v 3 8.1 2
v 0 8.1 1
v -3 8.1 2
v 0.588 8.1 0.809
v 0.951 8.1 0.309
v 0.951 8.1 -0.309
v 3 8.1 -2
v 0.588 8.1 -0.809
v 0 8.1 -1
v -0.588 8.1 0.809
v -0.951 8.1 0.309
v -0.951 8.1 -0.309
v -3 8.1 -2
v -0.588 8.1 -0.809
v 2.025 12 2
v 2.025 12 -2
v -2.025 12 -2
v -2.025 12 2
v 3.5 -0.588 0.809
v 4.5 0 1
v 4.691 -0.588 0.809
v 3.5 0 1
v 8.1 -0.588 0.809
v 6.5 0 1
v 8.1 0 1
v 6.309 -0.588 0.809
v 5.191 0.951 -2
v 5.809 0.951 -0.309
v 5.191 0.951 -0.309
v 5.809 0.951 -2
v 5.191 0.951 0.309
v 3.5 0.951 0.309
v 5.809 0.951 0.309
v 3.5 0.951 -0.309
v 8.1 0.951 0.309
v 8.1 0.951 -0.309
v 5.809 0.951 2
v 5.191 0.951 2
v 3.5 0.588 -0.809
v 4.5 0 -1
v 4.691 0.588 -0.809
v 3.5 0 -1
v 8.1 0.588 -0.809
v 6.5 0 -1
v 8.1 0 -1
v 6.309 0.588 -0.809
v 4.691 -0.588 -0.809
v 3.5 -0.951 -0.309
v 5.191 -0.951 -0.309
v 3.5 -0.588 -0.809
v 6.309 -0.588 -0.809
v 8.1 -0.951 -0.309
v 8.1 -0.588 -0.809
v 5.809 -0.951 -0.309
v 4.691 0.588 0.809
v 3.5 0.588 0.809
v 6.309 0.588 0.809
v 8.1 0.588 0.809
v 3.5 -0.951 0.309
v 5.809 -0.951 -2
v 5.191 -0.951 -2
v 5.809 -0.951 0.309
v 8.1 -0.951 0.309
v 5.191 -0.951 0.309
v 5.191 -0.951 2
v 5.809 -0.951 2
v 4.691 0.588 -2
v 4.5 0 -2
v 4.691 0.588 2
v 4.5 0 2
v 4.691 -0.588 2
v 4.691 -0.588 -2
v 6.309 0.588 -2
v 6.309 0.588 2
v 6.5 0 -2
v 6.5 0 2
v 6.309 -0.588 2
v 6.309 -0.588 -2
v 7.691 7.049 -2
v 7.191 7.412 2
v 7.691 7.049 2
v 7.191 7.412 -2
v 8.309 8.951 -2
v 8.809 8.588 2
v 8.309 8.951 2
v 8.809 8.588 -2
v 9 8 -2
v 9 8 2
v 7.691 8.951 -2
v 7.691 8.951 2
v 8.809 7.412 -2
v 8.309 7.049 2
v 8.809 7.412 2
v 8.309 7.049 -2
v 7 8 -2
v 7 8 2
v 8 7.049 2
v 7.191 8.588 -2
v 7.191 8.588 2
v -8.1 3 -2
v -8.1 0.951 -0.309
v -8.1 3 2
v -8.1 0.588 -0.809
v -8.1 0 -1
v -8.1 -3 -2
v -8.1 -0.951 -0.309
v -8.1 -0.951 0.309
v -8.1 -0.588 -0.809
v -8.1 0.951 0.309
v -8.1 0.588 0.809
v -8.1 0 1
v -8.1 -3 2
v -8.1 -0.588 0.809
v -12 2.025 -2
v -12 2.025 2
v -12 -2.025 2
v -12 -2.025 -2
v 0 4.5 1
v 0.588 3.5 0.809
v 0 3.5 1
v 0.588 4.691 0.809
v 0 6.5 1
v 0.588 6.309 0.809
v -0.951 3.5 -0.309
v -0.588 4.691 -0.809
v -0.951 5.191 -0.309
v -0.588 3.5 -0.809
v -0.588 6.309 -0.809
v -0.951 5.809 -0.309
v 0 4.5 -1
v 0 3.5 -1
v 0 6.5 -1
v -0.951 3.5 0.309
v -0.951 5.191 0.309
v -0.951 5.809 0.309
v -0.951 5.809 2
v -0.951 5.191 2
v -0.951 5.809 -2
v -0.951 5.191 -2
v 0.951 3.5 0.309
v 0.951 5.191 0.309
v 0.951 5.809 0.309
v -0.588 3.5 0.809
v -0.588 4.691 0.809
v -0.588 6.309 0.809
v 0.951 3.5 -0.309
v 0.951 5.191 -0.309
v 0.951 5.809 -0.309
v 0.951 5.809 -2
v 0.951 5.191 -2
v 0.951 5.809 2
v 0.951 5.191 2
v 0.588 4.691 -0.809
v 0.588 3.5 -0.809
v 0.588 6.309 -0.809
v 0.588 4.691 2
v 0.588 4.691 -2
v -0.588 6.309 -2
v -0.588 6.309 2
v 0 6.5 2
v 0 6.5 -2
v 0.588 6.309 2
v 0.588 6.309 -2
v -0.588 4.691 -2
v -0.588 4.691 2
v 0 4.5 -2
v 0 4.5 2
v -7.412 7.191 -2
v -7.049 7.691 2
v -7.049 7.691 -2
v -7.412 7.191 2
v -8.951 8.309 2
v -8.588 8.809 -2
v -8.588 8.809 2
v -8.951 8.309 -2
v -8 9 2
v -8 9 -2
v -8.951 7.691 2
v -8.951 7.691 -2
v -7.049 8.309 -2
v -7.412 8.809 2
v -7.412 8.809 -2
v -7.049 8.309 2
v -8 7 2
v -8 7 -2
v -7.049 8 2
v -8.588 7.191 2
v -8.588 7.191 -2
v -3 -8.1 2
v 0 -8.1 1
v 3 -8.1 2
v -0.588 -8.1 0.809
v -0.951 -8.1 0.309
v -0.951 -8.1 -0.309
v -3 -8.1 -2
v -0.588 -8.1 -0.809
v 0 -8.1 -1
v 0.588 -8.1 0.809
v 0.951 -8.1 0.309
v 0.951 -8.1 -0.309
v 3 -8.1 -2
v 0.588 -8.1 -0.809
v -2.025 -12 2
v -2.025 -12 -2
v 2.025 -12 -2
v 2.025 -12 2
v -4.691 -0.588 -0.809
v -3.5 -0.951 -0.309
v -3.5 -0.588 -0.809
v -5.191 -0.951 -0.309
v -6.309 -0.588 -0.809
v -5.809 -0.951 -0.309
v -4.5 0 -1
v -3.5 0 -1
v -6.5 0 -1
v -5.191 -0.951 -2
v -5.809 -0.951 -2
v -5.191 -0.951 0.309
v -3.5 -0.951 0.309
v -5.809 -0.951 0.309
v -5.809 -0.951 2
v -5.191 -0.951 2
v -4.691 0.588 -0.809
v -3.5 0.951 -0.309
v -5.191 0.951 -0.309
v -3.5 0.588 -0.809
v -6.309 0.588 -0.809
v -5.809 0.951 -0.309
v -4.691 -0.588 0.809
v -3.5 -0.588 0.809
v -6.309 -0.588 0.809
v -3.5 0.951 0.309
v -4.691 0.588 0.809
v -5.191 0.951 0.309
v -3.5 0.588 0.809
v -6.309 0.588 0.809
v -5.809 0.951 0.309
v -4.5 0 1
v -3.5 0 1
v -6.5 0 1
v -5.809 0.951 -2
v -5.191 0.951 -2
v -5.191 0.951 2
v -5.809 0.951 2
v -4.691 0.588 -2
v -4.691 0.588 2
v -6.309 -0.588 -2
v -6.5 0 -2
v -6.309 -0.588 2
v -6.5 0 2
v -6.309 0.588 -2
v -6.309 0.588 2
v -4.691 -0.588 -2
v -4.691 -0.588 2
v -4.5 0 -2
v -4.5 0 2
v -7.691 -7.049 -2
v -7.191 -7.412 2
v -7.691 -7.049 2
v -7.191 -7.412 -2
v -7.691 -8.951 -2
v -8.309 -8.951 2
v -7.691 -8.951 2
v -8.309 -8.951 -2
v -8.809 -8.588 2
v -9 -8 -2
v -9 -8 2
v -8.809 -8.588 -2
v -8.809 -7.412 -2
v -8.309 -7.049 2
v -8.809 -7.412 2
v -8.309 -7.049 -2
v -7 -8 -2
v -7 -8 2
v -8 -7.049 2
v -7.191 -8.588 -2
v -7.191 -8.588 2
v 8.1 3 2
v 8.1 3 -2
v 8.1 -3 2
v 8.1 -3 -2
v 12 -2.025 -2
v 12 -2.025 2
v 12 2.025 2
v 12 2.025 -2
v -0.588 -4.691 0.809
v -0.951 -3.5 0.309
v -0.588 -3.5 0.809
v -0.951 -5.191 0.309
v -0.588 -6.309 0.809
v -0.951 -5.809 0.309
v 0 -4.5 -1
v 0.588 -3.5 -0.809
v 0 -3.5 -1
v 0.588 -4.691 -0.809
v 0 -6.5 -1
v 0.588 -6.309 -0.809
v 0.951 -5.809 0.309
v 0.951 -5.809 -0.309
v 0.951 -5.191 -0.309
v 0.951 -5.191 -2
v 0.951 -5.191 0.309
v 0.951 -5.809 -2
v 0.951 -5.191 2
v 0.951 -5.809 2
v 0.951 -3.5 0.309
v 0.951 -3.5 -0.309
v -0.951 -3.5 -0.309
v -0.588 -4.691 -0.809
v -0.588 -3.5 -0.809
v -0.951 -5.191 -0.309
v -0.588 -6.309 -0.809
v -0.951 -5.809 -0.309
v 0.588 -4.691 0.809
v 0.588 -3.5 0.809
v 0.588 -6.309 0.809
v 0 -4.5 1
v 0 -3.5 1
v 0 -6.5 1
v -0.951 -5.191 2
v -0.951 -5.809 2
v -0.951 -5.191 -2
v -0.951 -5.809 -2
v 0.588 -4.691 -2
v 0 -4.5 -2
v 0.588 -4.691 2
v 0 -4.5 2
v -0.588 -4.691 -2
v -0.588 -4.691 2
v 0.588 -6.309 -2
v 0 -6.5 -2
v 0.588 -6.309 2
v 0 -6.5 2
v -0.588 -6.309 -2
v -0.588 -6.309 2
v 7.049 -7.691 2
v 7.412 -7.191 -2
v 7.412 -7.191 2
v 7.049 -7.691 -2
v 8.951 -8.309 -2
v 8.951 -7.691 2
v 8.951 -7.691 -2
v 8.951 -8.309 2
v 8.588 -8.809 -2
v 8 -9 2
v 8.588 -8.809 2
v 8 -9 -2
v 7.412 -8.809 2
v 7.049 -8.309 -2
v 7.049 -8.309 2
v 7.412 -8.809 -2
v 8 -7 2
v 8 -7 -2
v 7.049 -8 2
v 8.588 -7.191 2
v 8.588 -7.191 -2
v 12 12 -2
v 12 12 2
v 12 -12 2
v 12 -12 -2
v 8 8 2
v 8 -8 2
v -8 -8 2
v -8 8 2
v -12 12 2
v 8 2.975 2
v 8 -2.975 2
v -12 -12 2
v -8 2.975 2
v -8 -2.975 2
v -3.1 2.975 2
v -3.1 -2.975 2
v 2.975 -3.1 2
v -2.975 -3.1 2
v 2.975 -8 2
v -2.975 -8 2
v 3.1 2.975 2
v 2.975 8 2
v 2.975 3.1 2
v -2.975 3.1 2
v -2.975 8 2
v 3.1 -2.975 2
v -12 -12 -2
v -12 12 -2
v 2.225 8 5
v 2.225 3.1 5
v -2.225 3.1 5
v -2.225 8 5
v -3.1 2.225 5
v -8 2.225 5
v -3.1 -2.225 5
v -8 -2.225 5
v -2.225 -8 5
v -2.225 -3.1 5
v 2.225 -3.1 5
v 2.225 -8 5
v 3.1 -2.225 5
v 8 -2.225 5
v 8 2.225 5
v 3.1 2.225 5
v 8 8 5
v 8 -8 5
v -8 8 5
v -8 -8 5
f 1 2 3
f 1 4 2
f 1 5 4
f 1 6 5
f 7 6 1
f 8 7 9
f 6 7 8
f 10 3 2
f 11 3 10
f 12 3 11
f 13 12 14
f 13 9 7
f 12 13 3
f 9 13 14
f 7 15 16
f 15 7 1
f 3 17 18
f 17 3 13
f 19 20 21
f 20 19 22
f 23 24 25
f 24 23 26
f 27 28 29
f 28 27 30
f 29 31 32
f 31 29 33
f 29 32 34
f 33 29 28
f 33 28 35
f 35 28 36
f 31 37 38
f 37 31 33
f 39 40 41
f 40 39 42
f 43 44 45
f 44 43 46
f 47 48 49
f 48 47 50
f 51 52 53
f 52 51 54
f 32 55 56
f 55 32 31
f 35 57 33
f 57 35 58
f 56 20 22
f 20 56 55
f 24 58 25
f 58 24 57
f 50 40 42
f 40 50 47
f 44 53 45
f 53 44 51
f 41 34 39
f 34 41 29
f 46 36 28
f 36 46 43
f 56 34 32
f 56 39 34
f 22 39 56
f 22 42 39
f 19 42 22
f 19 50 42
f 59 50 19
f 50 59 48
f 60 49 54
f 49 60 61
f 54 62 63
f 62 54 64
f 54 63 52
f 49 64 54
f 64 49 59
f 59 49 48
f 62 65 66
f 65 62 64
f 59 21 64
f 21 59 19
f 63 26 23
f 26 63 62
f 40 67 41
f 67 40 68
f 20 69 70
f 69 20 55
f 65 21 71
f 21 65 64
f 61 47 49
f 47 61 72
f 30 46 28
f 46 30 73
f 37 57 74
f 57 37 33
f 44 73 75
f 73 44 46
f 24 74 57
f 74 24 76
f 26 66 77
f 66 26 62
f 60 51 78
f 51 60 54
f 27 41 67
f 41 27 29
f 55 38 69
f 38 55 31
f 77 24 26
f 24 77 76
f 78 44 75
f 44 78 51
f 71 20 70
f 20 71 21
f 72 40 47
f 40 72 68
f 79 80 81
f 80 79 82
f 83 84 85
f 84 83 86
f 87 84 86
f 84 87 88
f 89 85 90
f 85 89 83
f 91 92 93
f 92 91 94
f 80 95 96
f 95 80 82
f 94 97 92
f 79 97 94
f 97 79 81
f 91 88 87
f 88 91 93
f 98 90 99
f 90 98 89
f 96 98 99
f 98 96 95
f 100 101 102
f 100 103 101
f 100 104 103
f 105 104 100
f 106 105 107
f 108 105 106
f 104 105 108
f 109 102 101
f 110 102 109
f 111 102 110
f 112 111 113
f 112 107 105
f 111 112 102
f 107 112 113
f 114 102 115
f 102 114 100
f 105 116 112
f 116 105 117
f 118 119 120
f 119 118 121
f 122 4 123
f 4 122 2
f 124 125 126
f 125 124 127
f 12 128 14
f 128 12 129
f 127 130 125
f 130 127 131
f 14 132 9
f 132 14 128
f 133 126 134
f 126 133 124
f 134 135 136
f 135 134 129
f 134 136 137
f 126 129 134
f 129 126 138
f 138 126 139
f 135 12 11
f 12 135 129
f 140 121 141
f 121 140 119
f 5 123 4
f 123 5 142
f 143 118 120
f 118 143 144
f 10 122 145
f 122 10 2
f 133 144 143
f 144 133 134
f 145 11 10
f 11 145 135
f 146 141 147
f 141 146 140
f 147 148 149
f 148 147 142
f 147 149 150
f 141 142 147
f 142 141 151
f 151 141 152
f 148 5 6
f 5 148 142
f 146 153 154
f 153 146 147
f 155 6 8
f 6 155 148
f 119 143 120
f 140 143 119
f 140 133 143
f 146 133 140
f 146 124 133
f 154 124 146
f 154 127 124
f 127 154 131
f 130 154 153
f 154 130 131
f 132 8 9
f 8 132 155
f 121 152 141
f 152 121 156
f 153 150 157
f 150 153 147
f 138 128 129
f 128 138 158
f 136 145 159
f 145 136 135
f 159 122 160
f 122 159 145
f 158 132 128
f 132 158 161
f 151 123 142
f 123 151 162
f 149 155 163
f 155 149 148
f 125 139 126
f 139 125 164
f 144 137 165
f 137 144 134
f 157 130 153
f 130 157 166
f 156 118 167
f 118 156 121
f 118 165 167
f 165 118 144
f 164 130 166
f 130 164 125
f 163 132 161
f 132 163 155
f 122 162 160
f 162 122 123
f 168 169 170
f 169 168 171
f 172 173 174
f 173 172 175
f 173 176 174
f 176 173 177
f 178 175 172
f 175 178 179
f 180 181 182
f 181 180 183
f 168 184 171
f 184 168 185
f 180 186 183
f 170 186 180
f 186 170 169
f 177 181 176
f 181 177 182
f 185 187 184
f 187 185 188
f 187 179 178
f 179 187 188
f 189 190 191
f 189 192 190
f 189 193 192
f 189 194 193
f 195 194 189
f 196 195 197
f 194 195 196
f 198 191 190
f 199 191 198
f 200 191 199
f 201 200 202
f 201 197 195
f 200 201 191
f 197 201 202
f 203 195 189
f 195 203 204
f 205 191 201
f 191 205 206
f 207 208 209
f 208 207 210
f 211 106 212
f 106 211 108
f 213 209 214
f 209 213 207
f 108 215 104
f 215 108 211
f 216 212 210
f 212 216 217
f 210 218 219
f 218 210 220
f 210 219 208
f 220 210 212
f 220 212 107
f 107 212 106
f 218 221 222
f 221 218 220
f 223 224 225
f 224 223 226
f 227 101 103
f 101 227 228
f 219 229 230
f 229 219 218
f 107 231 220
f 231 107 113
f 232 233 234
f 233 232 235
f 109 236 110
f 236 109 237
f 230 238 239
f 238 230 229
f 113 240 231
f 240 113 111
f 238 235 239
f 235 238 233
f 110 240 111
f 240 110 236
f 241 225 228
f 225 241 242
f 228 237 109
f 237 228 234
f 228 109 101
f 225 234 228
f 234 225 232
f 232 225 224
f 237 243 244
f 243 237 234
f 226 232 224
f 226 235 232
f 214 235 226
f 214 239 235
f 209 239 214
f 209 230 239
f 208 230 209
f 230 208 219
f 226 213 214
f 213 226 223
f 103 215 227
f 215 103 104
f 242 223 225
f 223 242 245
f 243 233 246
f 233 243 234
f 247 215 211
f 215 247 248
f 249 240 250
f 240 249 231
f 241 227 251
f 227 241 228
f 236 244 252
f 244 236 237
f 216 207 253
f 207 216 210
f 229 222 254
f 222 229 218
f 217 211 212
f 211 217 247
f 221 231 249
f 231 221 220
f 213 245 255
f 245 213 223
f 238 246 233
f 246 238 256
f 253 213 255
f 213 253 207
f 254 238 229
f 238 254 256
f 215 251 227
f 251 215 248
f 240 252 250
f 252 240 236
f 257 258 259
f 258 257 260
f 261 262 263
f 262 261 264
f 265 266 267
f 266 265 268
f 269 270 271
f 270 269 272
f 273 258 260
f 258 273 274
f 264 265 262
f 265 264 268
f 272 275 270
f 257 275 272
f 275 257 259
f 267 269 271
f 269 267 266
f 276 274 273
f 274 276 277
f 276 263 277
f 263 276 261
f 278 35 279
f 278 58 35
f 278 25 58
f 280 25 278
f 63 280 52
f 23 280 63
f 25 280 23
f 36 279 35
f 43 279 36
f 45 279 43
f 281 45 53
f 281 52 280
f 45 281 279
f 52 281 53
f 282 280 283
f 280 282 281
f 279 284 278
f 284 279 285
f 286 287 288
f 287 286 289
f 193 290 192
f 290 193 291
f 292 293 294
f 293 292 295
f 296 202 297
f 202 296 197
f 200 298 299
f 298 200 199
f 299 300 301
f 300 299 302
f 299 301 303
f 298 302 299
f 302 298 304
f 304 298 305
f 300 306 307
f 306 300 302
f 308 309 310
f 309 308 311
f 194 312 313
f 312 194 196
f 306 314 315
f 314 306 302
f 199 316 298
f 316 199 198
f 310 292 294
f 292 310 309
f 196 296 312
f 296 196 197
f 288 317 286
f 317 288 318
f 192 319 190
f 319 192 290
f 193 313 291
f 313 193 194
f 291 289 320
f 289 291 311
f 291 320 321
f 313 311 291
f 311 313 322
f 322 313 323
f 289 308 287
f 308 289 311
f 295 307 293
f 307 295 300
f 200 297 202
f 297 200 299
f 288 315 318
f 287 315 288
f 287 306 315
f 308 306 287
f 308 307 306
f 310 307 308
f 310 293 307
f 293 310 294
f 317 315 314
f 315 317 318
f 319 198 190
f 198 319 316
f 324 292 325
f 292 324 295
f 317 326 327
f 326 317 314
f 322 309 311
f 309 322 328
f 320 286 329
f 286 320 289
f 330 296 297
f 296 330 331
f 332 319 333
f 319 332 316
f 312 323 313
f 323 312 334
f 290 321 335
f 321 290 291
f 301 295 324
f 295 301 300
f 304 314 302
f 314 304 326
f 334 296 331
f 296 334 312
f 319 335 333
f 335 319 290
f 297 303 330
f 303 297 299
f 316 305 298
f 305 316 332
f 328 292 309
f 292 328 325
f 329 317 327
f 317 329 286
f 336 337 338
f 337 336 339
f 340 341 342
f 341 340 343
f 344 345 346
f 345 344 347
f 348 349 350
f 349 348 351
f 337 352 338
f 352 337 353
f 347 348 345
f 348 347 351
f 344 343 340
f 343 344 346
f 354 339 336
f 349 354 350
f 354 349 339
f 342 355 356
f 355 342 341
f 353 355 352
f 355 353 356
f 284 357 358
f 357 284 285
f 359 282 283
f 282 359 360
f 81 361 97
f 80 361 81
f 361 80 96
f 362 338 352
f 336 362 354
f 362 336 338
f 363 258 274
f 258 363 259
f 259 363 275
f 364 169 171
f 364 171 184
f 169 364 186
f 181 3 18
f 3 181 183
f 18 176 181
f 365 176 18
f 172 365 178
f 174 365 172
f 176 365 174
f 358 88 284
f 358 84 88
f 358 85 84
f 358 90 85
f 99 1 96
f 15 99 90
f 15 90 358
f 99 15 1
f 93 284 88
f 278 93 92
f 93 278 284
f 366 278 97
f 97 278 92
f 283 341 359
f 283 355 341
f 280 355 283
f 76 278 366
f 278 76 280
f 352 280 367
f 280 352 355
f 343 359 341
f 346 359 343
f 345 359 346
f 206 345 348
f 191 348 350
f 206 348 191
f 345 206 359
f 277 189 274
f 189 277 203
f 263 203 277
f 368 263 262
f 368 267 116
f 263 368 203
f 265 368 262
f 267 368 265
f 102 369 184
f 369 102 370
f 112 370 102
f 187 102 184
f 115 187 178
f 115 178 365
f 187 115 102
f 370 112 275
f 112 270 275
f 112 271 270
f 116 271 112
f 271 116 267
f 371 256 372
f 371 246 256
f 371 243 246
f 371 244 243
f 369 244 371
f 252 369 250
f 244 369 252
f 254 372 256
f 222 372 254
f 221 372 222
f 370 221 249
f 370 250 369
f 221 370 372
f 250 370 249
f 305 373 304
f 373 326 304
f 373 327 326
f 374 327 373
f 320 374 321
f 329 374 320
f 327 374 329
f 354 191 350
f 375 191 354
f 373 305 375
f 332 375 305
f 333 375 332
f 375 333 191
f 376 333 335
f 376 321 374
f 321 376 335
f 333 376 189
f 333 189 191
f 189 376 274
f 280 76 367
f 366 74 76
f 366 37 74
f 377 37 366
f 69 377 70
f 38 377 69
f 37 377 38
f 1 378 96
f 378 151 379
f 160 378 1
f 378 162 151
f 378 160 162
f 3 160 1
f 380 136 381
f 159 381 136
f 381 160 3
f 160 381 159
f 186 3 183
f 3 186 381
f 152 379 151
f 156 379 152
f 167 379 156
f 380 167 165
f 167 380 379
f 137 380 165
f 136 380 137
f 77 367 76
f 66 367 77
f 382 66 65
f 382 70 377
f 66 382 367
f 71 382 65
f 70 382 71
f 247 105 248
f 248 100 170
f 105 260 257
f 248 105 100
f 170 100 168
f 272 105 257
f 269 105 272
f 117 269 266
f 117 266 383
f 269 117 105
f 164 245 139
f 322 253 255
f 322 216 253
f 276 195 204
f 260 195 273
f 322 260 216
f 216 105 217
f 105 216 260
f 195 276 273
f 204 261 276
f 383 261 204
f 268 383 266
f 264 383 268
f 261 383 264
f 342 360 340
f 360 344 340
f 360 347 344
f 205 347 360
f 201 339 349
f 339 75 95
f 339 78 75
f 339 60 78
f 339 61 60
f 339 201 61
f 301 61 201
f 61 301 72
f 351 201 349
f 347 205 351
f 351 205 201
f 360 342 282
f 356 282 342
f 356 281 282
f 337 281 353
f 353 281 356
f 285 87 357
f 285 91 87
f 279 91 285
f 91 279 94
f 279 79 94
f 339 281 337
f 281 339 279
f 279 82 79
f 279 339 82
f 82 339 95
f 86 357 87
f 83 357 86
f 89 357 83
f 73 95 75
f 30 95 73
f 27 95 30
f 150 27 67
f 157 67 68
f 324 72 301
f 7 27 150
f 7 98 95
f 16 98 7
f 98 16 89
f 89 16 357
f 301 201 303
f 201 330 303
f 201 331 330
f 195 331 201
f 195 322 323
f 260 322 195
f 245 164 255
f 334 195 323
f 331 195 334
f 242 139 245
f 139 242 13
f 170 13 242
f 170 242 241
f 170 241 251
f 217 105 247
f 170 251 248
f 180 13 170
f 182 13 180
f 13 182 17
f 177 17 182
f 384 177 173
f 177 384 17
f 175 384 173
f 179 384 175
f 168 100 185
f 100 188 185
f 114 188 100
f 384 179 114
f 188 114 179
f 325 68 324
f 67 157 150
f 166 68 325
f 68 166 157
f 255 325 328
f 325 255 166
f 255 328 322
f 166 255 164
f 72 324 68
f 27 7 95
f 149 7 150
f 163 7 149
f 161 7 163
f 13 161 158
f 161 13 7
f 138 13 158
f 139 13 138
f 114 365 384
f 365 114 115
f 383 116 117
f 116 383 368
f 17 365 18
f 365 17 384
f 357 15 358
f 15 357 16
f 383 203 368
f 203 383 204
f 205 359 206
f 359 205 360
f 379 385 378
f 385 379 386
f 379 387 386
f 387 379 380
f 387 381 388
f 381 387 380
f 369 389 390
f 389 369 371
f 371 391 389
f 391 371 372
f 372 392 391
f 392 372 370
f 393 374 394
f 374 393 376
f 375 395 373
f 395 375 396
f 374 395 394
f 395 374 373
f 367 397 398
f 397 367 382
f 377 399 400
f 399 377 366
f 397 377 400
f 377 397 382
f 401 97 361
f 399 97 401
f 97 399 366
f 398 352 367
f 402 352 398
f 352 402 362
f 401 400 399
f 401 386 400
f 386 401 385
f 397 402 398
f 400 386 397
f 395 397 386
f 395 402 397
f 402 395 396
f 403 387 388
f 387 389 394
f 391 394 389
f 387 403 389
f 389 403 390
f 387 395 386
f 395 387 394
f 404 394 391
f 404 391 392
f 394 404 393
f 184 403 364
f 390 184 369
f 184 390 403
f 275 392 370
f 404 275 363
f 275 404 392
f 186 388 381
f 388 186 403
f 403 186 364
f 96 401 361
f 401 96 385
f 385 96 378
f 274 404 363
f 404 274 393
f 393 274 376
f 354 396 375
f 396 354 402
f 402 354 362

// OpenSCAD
// file: TrapezioIsoceles.scad
module TrapezioIsoceles(profundidade,largura,altura,deslocamento) {

//altura = 4;
//profundidade = 5; 
//largura = 6;
//deslocamento = 1; 
//altura=altura+0.2;
deslocamentoZ = -altura/2;
deslocamentoX = -largura/2; 
deslocamentoY = -profundidade/2;

pontosTrapezio = [
  [ deslocamentoX, deslocamentoY,  deslocamentoZ ],  //0
  [ deslocamentoX+largura, deslocamentoY,  deslocamentoZ ],  //1
  [ deslocamentoX+largura, deslocamentoY+profundidade,  deslocamentoZ ],  //2
  [ deslocamentoX+0, deslocamentoY+profundidade, deslocamentoZ ],  //3
  [ deslocamentoX+deslocamento,  deslocamentoY, deslocamentoZ+altura ],  //4
  [ deslocamentoX+largura-deslocamento,  deslocamentoY, deslocamentoZ+altura ],  //5
  [ deslocamentoX+largura-deslocamento,deslocamentoY+profundidade, deslocamentoZ+altura ],  //6
  [ deslocamentoX+deslocamento,  deslocamentoY+profundidade, deslocamentoZ+altura ]]; //7
  
facesTrapezio = [
  [0,1,2,3],  // bottom
  [4,5,1,0],  // front
  [7,6,5,4],  // top
  [5,6,2,1],  // right
  [6,7,3,2],  // back
  [7,4,0,3]]; // left
  
polyhedron( pontosTrapezio, facesTrapezio );


//polygon([[0,0],[5,0],[4,3],[1,3]]);

//cube([17,17,3]);
}
// file: EncaixeU.scad
use <TrapezioIsoceles.scad>


module EncaixeU(tamCubo)  {

altura = 4; 
//tamCubo = 24; 

profundidadeTrapezio = 5; 
larguraTrapezio = 6; 
posTrapezio = tamCubo/2 - altura/2;
hFuros = profundidadeTrapezio;

tamCuboSuperior = tamCubo - 2*altura ; 
posTrapezioSuperior = tamCuboSuperior/2 - profundidadeTrapezio/2;

union() {
// Base da estrutra de encaixe 
difference() {
    cube([tamCubo,tamCubo,altura],center=true);
    for ( a = [0:90:270]) {
        rotate([0,0,a])
        translate([0,posTrapezio+0.1,0])
        rotate([270,0,0]) 
        TrapezioIsoceles(profundidadeTrapezio,larguraTrapezio,altura,1);
        // Furos para hastes perpendiculares 
        rotate([0,0,a])
        translate([posTrapezio-altura,0,0])
        rotate([0,90,0]) 
        cylinder (hFuros, r=1, center = true, $fn=10);
        // Furos para hastes paralelas 
        rotate([0,0,a])
        translate([posTrapezioSuperior,0,0])
        cylinder (hFuros, r=1, center = true, $fn=10);
        // Furos para chapa de plástico
        rotate([0,0,a])
        translate([tamCuboSuperior/2,tamCuboSuperior/2,0])
        cylinder (hFuros, r=1, center = true, $fn=10);
    }
}


// Parte superior da estrutra 
translate([0,0,(2*altura-1)/2]) {
    difference() { 
        cube( [tamCuboSuperior,tamCuboSuperior,altura-1], center=true);
        for ( a = [0:90:270]) {
            rotate([0,0,a]) 
            translate([0,posTrapezioSuperior+0.1,0.4])
            TrapezioIsoceles(profundidadeTrapezio,larguraTrapezio,altura,1);
        }
    }
}
}

}
// main file
use <EncaixeU.scad>

tamanho = 24;

// Cria um encaixe universal com tamanho 
//determinado pela variável 'tamanho'
EncaixeU(tamanho);
